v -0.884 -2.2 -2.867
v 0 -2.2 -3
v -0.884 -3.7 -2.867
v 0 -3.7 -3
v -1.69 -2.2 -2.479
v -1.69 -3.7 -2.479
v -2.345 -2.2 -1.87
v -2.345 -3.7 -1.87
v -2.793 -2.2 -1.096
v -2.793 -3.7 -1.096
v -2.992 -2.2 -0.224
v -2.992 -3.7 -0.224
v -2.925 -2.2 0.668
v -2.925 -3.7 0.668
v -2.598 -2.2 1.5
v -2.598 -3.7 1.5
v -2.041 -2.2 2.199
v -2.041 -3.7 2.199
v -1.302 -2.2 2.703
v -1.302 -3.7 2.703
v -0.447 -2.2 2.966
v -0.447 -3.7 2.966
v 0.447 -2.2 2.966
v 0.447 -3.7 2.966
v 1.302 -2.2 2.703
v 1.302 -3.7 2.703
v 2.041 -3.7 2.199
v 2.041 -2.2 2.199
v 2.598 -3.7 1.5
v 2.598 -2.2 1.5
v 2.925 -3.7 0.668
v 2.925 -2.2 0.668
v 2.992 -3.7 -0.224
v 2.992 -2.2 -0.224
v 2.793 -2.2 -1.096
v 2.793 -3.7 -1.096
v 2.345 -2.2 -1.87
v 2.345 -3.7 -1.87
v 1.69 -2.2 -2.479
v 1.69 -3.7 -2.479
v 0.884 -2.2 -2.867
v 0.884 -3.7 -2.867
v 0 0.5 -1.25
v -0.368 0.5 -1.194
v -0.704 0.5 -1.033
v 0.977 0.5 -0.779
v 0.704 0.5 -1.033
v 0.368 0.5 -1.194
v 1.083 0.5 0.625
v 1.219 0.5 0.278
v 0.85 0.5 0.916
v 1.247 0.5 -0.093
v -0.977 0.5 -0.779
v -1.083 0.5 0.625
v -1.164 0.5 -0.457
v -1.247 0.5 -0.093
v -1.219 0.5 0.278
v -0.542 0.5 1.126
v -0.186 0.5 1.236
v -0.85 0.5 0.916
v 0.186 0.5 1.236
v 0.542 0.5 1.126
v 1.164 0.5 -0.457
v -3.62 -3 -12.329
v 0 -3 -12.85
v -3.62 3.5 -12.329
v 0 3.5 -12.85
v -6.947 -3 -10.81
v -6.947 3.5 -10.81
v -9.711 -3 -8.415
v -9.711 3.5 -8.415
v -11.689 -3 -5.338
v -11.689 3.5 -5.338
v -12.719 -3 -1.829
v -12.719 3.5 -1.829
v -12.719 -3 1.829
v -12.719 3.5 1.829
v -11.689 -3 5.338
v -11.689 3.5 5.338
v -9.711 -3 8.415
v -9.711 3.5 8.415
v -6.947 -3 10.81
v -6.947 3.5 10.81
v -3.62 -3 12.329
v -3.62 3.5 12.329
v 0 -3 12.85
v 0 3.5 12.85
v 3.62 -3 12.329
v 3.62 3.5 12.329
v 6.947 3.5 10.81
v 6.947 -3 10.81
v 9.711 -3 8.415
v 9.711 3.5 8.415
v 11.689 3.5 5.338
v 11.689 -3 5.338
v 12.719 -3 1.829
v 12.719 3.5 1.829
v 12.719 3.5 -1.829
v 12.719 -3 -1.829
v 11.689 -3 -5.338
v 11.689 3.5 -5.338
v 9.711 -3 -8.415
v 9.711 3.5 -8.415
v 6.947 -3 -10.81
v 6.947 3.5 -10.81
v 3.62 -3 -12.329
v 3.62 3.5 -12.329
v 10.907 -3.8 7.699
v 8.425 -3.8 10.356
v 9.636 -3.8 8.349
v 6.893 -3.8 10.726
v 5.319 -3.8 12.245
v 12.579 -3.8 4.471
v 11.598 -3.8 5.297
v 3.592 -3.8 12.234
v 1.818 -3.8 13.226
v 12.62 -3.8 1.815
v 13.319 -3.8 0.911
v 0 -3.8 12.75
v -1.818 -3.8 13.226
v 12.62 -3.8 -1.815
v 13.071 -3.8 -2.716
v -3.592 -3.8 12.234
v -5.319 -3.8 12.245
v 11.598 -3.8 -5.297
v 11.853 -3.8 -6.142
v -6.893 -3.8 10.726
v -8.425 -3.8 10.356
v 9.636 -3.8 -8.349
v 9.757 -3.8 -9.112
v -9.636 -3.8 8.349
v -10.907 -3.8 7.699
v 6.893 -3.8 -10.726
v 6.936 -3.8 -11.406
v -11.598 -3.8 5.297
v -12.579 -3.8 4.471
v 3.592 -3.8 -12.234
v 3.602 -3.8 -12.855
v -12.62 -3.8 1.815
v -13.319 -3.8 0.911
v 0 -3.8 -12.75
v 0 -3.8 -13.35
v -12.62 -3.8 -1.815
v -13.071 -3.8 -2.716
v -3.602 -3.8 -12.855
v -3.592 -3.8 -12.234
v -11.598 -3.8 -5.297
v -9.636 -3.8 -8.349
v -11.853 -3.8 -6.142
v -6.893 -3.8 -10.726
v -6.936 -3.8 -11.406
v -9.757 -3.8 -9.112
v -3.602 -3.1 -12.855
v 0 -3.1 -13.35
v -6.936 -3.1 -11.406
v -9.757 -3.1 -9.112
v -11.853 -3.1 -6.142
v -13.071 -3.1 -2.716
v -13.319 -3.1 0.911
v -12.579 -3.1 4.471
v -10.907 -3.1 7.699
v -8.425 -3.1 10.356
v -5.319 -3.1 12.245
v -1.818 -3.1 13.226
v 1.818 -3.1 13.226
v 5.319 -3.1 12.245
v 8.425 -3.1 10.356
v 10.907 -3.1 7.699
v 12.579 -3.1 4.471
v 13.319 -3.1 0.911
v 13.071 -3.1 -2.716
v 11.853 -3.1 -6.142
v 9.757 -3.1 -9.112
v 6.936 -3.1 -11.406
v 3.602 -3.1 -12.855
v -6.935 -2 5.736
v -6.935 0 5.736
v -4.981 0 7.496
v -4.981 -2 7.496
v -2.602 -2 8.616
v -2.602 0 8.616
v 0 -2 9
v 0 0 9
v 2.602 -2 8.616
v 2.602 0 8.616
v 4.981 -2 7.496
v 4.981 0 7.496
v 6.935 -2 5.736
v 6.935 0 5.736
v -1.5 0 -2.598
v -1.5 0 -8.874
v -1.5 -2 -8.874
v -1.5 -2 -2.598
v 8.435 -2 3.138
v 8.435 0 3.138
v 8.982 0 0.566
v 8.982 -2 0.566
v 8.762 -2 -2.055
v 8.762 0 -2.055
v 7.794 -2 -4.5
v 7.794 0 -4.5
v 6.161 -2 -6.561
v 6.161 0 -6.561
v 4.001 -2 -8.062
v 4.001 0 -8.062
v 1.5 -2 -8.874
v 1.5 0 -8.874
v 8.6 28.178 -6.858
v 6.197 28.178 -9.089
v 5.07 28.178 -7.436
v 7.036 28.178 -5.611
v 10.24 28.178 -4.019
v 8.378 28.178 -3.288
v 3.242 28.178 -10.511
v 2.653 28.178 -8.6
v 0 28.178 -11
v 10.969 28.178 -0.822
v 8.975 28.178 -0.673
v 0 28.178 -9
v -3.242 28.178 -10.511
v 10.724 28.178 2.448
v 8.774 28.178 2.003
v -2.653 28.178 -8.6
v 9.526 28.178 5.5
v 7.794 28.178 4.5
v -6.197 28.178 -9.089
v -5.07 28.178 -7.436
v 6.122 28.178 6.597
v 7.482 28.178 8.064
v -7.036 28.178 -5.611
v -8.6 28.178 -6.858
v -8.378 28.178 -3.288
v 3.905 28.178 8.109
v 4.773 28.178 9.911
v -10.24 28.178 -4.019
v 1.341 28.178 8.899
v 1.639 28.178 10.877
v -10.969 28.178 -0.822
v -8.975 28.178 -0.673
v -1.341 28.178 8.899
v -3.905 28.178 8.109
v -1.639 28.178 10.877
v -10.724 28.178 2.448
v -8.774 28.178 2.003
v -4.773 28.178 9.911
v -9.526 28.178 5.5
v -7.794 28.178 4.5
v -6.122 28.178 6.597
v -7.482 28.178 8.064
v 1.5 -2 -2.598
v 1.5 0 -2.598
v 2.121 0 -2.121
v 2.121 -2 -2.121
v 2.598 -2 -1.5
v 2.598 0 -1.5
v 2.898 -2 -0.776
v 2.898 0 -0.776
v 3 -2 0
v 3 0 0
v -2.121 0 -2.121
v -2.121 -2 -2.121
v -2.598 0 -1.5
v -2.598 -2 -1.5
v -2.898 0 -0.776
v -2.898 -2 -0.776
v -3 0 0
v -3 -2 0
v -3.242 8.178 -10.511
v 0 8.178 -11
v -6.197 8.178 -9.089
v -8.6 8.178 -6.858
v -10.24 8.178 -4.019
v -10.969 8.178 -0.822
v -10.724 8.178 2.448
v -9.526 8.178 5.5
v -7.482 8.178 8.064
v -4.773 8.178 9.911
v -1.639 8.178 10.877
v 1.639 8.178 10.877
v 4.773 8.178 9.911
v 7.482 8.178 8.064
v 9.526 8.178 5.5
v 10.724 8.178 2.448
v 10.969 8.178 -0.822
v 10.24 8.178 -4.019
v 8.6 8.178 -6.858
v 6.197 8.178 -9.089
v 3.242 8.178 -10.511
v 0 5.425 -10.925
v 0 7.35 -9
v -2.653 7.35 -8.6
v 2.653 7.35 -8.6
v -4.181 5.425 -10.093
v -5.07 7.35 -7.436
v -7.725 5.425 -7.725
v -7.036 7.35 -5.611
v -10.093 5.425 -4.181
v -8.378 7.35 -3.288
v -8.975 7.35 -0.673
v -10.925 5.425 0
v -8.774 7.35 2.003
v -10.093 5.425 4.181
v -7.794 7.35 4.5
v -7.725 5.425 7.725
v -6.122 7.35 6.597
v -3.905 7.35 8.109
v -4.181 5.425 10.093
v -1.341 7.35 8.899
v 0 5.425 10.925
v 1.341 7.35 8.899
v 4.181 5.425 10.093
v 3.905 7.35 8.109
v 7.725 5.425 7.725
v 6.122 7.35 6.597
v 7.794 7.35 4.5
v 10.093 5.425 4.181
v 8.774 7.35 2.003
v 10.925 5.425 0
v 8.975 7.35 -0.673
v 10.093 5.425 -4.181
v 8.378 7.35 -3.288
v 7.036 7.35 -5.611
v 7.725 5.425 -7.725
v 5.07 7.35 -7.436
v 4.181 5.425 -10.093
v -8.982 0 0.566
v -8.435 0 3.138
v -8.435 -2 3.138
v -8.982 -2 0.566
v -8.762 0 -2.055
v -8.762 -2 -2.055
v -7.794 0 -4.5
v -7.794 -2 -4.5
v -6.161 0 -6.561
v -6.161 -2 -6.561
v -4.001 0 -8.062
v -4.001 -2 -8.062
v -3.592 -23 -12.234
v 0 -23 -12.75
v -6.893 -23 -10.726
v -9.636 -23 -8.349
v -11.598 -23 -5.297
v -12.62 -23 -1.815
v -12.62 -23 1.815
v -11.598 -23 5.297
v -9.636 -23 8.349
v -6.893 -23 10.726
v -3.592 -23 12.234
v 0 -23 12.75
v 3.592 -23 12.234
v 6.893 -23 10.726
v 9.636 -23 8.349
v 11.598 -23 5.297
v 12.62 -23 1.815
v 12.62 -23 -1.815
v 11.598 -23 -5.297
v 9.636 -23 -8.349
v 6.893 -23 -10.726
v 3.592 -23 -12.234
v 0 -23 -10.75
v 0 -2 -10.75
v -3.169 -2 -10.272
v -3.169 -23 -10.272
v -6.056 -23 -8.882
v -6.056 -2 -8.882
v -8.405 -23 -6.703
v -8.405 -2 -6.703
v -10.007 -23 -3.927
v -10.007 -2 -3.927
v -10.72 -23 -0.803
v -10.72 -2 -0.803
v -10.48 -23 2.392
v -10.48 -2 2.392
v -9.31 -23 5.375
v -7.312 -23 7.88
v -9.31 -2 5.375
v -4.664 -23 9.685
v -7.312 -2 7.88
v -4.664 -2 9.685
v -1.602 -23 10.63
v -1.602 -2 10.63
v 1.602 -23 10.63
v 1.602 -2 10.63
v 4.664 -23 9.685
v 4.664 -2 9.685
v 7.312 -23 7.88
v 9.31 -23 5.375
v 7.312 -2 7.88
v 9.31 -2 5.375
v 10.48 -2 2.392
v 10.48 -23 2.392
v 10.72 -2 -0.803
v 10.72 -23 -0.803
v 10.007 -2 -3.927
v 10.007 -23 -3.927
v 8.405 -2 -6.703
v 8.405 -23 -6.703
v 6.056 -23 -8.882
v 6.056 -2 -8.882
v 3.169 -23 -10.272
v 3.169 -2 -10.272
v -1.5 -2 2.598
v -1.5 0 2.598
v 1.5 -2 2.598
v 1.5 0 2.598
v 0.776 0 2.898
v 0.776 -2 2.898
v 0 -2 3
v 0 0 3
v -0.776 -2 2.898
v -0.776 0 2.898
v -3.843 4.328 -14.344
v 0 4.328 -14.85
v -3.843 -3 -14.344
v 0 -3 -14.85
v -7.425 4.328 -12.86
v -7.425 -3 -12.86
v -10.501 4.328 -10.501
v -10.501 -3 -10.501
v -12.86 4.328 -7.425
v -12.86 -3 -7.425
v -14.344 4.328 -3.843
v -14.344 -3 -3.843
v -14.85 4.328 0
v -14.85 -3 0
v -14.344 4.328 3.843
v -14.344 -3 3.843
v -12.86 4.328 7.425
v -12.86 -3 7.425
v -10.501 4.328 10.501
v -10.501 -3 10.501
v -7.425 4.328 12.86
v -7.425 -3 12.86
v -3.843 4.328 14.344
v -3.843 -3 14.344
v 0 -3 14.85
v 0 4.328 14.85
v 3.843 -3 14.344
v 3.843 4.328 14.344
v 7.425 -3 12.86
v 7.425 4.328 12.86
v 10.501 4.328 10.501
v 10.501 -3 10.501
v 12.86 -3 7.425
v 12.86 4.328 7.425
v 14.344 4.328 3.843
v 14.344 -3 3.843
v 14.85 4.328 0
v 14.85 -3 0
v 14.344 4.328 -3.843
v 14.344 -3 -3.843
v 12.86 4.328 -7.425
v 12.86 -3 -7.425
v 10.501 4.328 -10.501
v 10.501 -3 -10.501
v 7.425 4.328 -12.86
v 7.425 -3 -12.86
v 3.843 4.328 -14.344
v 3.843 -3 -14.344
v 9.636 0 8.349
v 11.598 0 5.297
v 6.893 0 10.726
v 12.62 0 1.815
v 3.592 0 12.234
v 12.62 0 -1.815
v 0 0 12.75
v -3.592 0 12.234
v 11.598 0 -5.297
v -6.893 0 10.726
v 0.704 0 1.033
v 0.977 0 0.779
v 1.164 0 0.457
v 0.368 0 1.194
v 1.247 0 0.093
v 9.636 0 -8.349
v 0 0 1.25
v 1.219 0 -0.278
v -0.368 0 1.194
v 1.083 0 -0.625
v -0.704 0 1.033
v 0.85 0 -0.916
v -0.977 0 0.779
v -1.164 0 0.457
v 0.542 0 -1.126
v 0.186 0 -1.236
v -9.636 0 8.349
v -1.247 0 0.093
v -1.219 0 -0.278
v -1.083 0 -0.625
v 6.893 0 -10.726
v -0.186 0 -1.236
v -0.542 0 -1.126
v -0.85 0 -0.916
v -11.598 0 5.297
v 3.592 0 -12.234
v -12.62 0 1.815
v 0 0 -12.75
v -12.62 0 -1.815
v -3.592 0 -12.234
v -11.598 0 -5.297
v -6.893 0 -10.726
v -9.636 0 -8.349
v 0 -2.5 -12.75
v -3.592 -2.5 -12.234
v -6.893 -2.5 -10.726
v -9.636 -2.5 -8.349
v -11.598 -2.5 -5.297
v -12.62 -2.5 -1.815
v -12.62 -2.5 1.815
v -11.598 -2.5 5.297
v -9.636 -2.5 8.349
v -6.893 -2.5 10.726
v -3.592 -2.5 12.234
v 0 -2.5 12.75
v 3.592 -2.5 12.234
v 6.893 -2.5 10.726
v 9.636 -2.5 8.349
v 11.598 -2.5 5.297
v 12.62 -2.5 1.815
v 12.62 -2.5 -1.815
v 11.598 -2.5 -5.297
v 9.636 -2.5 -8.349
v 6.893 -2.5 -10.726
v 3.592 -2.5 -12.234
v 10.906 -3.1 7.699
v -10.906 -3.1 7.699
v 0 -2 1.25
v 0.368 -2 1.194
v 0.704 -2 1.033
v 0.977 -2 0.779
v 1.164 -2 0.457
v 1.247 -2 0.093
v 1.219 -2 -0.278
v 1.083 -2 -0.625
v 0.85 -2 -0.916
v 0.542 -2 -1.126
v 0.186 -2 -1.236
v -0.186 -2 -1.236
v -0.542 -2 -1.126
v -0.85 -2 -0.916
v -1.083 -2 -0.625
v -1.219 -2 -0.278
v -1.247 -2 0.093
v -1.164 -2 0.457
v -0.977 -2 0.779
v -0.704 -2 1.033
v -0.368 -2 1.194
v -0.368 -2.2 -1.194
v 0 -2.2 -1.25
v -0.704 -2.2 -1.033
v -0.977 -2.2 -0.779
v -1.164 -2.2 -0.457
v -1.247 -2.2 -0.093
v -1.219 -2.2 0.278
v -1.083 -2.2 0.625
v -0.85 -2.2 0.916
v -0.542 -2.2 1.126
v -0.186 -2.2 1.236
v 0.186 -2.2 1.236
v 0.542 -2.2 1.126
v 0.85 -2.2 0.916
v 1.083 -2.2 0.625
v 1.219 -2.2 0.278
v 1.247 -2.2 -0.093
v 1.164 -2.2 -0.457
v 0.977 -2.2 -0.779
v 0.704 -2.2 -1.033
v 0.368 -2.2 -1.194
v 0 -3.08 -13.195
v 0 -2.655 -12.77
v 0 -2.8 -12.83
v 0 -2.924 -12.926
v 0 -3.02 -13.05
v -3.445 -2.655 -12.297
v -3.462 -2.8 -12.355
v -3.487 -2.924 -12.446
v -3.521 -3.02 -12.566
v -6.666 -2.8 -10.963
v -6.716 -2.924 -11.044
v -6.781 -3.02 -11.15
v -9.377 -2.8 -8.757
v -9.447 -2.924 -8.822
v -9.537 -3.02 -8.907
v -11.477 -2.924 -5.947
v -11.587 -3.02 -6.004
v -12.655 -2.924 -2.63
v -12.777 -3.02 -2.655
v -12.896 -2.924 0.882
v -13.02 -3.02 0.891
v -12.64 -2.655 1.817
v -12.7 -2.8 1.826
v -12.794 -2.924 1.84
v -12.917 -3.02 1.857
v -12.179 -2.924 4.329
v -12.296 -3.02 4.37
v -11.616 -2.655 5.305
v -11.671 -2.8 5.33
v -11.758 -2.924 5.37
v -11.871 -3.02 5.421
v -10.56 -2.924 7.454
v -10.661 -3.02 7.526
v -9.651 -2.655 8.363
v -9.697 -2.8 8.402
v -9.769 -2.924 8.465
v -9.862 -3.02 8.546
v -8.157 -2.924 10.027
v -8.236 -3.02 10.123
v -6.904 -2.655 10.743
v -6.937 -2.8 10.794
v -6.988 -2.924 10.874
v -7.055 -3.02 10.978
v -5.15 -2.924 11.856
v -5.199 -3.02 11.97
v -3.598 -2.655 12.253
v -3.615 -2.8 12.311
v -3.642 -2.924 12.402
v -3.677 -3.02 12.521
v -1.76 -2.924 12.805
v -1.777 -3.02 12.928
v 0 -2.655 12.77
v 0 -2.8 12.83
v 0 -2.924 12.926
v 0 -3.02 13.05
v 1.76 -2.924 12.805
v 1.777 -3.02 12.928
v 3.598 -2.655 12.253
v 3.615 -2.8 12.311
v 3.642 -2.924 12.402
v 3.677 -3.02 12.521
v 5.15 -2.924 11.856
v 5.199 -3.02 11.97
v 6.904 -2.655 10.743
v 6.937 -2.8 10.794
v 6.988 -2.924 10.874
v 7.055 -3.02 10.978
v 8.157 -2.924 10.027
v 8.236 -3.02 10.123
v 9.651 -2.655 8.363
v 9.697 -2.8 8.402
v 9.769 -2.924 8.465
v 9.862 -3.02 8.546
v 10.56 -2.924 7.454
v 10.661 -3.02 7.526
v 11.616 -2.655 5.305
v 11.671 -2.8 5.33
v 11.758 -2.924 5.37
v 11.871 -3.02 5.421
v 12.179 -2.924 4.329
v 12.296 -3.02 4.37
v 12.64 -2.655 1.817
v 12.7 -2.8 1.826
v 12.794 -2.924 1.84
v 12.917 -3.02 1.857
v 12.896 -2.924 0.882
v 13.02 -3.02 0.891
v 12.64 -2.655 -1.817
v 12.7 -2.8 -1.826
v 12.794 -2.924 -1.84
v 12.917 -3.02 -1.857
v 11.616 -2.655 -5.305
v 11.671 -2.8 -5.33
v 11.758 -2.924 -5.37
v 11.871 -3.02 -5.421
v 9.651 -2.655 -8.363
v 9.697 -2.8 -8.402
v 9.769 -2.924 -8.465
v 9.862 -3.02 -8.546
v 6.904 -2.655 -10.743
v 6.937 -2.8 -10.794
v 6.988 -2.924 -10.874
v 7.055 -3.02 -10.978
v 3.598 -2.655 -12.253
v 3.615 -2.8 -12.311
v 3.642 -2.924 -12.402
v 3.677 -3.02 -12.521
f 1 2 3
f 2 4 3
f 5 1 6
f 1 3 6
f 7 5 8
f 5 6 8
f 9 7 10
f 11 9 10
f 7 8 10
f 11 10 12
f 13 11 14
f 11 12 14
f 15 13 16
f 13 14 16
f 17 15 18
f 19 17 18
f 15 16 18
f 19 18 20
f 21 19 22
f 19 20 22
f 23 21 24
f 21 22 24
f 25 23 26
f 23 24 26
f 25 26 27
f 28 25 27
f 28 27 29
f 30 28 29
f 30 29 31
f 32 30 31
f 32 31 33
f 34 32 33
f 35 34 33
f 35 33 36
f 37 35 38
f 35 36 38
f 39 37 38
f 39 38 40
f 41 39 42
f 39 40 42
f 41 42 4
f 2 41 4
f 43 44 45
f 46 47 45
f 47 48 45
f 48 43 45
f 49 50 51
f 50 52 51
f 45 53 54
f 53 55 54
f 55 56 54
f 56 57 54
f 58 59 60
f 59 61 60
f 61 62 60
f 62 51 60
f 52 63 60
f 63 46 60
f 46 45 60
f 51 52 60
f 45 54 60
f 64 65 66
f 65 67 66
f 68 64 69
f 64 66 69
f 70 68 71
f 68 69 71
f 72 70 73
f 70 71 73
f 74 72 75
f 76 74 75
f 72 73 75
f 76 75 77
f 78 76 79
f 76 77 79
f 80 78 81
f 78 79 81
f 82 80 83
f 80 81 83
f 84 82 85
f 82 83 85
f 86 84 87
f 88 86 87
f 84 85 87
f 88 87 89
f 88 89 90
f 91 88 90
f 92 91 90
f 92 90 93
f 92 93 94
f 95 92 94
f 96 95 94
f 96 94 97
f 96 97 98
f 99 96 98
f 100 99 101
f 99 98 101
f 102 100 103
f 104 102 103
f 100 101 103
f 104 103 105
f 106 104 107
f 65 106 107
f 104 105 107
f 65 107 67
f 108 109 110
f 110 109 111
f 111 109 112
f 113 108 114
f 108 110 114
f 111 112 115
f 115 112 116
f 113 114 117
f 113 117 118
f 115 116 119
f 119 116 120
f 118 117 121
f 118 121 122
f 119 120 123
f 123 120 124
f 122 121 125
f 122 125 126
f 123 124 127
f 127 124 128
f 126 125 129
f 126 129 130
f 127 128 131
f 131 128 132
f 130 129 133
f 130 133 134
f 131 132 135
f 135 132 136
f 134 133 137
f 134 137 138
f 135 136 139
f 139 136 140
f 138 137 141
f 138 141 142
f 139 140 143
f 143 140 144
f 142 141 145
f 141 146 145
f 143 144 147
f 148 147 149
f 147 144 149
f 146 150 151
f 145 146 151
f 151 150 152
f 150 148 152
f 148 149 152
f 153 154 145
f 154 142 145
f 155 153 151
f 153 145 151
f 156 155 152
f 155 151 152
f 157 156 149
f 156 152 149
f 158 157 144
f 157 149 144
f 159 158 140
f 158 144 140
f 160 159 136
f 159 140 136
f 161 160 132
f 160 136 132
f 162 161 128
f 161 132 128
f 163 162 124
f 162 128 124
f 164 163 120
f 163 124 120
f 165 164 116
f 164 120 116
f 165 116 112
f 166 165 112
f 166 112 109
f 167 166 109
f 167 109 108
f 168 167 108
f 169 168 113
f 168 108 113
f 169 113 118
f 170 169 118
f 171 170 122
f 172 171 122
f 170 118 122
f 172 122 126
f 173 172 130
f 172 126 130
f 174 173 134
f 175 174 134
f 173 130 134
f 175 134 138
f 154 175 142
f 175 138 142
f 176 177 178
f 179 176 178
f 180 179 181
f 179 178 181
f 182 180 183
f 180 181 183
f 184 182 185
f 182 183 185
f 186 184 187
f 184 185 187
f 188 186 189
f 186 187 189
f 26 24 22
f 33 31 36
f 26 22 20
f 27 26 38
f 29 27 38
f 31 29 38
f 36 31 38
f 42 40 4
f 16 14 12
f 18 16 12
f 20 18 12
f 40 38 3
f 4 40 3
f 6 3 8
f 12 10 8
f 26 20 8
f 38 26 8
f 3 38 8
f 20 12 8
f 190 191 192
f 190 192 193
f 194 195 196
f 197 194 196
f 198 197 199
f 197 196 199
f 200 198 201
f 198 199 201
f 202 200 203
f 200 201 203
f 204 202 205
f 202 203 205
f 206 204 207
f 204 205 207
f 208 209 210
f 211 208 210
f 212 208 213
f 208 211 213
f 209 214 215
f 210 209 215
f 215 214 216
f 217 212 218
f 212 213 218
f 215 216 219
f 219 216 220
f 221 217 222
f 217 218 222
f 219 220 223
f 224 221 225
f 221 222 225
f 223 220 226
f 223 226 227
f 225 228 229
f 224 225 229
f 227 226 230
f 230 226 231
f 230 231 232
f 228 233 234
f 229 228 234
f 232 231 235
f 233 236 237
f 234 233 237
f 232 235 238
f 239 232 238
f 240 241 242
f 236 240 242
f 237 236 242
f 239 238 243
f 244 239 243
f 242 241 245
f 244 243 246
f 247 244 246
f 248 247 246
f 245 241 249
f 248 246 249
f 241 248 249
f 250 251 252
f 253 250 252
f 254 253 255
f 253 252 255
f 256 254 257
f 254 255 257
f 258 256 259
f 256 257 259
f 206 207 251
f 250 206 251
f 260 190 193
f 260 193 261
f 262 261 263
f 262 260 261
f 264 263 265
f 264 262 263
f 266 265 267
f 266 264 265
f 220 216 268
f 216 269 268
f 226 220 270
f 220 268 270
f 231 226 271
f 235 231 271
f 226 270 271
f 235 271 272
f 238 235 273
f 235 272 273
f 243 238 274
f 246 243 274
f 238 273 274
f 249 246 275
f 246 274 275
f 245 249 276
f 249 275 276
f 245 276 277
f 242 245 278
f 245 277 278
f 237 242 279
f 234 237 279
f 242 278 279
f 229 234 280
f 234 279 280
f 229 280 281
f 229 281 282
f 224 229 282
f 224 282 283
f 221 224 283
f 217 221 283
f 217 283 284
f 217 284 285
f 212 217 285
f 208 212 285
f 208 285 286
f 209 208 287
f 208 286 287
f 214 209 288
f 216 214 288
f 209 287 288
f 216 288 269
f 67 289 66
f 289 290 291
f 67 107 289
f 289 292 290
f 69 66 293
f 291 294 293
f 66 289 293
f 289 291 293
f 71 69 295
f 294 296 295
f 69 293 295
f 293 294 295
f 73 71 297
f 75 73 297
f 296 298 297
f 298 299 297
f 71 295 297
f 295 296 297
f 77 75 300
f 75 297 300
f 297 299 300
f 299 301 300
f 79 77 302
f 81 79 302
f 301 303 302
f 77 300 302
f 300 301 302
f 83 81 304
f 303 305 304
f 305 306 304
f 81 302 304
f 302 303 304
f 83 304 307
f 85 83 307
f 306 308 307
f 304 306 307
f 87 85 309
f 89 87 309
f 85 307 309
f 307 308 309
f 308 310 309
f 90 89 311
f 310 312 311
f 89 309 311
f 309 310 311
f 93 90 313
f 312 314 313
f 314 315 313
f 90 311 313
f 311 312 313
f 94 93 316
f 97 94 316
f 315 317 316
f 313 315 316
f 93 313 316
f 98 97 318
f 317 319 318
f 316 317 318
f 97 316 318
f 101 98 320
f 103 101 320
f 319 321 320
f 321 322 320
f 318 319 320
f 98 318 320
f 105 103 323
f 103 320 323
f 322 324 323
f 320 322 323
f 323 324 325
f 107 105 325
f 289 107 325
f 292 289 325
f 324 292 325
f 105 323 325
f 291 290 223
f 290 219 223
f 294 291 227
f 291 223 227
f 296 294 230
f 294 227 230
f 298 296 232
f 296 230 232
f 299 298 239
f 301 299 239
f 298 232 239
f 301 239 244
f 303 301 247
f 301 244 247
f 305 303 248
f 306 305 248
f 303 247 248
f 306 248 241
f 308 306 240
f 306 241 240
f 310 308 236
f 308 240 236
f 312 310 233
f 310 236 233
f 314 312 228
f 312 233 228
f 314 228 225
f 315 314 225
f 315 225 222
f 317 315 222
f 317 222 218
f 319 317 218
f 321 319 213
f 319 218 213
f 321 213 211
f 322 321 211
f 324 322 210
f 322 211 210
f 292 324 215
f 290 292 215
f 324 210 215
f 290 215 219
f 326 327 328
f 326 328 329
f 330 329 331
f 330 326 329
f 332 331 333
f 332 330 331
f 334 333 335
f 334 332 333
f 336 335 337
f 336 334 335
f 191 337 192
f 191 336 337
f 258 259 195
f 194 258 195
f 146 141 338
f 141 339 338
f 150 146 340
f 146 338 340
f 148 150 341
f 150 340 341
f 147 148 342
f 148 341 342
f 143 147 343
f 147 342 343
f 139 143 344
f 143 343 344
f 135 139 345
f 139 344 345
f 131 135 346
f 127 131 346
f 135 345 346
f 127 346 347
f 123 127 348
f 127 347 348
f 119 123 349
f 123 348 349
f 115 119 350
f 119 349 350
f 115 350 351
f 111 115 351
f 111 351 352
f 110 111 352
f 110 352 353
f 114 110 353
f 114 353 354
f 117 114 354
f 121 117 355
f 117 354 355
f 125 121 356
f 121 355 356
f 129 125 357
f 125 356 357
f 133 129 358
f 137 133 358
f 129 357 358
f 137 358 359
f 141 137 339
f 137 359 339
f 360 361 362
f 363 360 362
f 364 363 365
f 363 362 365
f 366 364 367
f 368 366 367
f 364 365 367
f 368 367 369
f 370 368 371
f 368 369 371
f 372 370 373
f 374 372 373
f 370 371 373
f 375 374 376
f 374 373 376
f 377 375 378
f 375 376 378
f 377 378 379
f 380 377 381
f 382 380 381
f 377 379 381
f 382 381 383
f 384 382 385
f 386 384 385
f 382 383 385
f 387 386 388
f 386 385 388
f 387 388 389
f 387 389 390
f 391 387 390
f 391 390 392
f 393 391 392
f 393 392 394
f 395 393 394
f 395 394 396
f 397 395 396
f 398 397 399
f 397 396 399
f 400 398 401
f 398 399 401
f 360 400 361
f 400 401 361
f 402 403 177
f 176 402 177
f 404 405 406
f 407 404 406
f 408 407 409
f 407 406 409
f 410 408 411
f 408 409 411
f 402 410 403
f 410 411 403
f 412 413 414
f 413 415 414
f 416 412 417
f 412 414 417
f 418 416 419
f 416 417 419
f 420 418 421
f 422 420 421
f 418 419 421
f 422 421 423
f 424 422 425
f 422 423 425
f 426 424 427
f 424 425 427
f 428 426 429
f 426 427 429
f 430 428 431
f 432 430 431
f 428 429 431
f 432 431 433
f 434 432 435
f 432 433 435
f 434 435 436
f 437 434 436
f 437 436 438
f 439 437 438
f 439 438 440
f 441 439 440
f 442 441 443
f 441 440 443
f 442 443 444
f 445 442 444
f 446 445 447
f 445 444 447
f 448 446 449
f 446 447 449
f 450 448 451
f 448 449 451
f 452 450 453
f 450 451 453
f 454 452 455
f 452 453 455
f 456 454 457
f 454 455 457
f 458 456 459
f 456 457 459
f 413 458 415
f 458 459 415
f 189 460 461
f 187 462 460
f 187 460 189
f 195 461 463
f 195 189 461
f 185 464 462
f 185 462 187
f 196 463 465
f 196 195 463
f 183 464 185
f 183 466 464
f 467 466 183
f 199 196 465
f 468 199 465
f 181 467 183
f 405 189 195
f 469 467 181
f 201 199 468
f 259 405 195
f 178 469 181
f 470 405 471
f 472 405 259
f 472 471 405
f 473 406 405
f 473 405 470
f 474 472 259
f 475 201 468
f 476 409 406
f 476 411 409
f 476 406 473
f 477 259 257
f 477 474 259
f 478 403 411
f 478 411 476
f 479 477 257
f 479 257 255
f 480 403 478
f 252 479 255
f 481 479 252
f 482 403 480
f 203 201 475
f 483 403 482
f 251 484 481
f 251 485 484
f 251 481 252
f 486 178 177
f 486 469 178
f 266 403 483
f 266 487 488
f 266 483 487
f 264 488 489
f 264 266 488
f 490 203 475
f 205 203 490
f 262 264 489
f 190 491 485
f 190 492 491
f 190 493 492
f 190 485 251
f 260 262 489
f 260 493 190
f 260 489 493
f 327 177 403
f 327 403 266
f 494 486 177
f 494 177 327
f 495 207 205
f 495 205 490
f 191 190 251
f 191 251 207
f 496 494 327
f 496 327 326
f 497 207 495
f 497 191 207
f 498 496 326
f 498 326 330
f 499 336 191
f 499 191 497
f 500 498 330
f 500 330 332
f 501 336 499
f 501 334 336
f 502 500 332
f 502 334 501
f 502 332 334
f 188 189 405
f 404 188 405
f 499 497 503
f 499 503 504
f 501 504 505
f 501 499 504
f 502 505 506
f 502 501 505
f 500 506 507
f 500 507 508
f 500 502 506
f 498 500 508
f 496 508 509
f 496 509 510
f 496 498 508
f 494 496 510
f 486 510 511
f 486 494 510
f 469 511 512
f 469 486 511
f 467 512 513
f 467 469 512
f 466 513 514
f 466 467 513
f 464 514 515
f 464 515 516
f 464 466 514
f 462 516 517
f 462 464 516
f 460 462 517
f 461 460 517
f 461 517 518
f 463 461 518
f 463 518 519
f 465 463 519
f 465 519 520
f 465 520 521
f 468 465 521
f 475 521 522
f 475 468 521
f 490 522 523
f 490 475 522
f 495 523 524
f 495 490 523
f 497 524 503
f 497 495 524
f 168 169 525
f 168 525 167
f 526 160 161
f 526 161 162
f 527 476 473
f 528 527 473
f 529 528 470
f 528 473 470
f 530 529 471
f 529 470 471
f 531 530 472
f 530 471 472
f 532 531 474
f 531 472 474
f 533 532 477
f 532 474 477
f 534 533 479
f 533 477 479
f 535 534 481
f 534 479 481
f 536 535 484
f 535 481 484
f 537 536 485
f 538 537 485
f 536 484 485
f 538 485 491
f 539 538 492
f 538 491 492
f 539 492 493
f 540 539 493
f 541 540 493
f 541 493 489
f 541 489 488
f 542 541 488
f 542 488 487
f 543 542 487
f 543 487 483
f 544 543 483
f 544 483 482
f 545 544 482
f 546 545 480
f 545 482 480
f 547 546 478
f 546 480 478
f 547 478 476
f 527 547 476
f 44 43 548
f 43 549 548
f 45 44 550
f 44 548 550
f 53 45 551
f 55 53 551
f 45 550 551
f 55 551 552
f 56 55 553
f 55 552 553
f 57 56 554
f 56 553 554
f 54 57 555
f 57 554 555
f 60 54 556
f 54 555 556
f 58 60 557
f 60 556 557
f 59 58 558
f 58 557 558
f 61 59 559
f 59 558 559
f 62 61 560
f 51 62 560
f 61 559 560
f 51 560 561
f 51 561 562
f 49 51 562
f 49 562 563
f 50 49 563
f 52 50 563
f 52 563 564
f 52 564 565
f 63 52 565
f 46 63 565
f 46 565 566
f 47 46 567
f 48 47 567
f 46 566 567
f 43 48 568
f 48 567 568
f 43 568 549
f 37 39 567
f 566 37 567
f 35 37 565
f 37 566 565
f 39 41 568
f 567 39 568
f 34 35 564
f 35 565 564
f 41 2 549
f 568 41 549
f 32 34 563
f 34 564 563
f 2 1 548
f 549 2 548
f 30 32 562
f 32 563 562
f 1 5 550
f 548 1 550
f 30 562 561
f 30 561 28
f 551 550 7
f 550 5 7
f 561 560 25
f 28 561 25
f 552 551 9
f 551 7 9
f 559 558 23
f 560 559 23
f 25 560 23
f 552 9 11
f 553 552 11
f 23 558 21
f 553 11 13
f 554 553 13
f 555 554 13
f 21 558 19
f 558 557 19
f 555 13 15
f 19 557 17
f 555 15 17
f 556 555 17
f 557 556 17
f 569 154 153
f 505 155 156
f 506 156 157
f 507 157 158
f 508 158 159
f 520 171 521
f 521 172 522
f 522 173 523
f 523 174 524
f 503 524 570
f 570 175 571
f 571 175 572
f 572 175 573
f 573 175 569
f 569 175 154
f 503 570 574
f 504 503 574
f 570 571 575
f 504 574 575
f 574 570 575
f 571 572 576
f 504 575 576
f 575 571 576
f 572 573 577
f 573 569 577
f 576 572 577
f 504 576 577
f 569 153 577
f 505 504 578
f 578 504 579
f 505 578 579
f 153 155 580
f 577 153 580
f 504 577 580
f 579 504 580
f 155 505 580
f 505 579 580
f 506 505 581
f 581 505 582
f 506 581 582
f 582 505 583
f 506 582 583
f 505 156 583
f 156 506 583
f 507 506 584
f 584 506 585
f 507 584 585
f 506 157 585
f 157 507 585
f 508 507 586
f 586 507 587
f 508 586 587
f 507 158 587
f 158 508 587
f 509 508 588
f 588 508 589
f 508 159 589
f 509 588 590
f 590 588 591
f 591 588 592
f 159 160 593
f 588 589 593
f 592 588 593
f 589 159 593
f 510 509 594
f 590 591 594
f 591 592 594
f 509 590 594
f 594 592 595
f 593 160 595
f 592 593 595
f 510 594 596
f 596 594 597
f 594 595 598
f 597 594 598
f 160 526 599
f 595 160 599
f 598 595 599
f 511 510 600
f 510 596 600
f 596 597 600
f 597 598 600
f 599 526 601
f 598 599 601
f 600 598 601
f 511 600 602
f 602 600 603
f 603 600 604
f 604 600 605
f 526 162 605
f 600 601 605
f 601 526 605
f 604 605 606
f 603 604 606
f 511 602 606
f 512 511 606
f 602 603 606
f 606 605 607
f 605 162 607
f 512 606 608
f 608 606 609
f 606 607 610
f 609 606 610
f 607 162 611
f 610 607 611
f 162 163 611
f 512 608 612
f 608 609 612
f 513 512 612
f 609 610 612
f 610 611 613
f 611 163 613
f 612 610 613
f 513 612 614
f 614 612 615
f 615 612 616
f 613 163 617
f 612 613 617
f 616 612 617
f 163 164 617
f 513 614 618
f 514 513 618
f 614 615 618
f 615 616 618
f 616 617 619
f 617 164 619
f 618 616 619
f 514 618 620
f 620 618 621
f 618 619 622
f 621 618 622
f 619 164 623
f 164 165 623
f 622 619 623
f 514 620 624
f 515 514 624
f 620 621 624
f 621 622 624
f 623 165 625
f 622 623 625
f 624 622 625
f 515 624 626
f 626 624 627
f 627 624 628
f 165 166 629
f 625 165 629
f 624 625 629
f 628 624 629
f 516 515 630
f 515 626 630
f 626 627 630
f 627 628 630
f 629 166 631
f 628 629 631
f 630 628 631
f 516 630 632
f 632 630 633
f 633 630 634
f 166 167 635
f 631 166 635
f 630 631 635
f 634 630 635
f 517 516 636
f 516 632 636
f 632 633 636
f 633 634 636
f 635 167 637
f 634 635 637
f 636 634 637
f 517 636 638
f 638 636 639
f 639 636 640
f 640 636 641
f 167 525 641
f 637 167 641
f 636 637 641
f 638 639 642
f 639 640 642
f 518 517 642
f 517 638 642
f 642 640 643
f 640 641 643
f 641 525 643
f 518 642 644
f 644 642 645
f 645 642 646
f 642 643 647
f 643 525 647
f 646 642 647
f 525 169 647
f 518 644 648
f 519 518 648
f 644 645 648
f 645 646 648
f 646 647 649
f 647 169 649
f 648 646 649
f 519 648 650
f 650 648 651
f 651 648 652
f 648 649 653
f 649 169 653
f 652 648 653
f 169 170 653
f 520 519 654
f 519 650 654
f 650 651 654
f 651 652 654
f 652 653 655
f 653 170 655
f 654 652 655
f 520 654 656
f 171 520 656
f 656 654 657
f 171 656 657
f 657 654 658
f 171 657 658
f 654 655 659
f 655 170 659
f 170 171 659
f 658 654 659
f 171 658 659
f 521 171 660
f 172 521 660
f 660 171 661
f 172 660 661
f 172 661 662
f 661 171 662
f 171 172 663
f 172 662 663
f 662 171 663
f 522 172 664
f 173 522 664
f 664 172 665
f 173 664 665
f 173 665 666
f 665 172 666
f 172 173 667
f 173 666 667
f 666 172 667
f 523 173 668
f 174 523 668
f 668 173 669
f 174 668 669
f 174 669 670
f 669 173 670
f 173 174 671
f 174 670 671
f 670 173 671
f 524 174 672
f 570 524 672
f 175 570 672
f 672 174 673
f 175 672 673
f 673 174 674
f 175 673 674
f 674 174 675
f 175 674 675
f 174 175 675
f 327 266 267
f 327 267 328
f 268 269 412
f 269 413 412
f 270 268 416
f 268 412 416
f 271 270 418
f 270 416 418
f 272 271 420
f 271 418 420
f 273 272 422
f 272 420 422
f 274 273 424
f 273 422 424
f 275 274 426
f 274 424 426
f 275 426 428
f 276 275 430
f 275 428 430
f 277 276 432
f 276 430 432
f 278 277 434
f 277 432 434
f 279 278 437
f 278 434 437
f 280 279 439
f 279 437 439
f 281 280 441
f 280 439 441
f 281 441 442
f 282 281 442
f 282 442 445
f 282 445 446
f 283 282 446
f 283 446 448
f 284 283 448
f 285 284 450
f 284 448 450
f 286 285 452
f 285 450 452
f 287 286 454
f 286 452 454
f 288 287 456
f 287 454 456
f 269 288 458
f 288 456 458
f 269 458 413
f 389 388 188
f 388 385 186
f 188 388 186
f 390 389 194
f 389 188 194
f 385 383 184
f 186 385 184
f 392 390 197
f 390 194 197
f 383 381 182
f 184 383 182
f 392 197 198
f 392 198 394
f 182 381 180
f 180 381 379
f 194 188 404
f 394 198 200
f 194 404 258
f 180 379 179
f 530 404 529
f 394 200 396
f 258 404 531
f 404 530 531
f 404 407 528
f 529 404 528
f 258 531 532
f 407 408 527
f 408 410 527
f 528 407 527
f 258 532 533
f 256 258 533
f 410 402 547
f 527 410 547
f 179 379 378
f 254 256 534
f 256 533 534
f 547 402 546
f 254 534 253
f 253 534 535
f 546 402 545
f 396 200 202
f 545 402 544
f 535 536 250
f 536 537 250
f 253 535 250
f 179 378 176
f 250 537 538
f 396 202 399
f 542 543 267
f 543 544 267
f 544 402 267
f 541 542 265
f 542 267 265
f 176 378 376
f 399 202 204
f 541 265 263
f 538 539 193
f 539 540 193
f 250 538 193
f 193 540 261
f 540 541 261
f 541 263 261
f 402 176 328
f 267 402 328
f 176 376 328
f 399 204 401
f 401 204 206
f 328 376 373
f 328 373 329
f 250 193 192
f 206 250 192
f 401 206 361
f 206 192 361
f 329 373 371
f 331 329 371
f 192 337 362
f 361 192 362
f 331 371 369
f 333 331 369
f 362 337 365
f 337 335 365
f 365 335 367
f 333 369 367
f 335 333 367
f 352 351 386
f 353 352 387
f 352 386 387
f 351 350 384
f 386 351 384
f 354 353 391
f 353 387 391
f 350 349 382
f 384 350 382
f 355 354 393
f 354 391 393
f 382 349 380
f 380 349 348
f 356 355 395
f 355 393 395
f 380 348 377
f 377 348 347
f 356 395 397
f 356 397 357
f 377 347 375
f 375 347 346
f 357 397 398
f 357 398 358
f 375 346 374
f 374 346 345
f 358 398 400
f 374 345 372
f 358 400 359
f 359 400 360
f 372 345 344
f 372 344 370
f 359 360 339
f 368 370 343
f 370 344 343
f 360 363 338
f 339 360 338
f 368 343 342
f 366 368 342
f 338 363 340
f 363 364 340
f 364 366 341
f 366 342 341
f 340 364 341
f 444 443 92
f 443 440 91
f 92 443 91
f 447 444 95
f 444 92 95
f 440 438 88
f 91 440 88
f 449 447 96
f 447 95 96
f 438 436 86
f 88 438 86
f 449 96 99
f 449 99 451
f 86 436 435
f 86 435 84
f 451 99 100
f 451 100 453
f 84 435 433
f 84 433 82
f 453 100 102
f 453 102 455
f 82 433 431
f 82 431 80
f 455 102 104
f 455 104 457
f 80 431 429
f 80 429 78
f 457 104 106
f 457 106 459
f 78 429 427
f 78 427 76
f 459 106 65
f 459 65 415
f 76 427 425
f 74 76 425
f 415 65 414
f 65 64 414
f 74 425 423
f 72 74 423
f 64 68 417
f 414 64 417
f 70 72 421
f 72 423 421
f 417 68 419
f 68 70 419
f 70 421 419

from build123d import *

# Parameters (mm, degrees)
SKETCH3_R           = 10.75
SKETCH3_R_2         = 1.25
BOSS_EXTRUDE1_DEPTH = 2
FILLET1_R           = 0.6


with BuildPart() as part:
    # Sketch1 → Revolve1 (revolve)
    with BuildSketch(Plane.XY, mode=Mode.PRIVATE) as revolve1_sk:
        Polygon((12.85, 3.5), (9, 7.35), (9, 28.178427125), (11, 28.178427125), (11, 8.178427125), (14.85, 4.328427125), (14.85, -3), (12.85, -3), align=None)
        Polygon((10.75, 0), (12.75, 0), (12.75, -1.5), (12.75, -3.1), (13.35, -3.1), (13.35, -3.8), (12.75, -3.8), (12.75, -23), (10.75, -23), align=None)
    revolve(revolve1_sk.sketch.rotate(Axis((0, 0, 0), (0, 1, 0)), 90), axis=Axis((0, 0, 0), (0, 1, 0)))

    # Sketch3 → Boss-Extrude1 (add)
    with BuildSketch(Plane(origin=(0, 0, 0), x_dir=(1, 0, 0), z_dir=(0, 1, 0))):
        with Locations(Location((0, 0, 0), (0, 0, 90))):
            Circle(SKETCH3_R)
        with Locations(Location((0, 0, 0), (0, 0, 270))):
            Circle(SKETCH3_R_2, mode=Mode.SUBTRACT)
        with BuildLine():
            Line((-1.5, 8.874119675), (-1.5, 2.598076211))
            ThreePointArc((-1.5, 2.598076211), (-2.598076211, 1.5), (-3, 0))
            Line((-3, 0), (-8.435213074, -3.138021732))
            ThreePointArc((-8.435213074, -3.138021732), (-7.794228634, 4.5), (-1.5, 8.874119675))
        make_face(mode=Mode.SUBTRACT)
        with BuildLine():
            Line((1.5, 8.874119675), (1.5, 2.598076211))
            ThreePointArc((1.5, 2.598076211), (2.598076211, 1.5), (3, 0))
            Line((3, 0), (8.435213074, -3.138021732))
            ThreePointArc((8.435213074, -3.138021732), (7.794228634, 4.5), (1.5, 8.874119675))
        make_face(mode=Mode.SUBTRACT)
        with BuildLine():
            Line((6.935213074, -5.736097943), (1.5, -2.598076211))
            ThreePointArc((1.5, -2.598076211), (0, -3), (-1.5, -2.598076211))
            Line((-1.5, -2.598076211), (-6.935213074, -5.736097943))
            ThreePointArc((-6.935213074, -5.736097943), (0, -9), (6.935213074, -5.736097943))
        make_face(mode=Mode.SUBTRACT)
    extrude(amount=-BOSS_EXTRUDE1_DEPTH)

    # Fillet1
    fillet1_edges = [part.edges().sort_by_distance(p)[0] for p in [
        (0, -3.1, 12.75),
    ]]
    fillet(fillet1_edges, radius=FILLET1_R - 0.0001)  # a hair under: the kernel refuses the full size


with BuildPart() as body_2:
    # Sketch5 → Revolve2 (revolve)
    with BuildSketch(Plane.XY, mode=Mode.PRIVATE) as revolve2_sk:
        Polygon((-1.25, 0.5), (-1.25, -2.2), (-3, -2.2), (-3, -3.7), (0, -3.7), (0, 0.5), align=None)
    revolve(revolve2_sk.sketch.rotate(Axis((0, 0, 0), (0, 1, 0)), 270), axis=Axis((0, 0, 0), (0, 1, 0)))


solid = Compound([part.part, body_2.part])
